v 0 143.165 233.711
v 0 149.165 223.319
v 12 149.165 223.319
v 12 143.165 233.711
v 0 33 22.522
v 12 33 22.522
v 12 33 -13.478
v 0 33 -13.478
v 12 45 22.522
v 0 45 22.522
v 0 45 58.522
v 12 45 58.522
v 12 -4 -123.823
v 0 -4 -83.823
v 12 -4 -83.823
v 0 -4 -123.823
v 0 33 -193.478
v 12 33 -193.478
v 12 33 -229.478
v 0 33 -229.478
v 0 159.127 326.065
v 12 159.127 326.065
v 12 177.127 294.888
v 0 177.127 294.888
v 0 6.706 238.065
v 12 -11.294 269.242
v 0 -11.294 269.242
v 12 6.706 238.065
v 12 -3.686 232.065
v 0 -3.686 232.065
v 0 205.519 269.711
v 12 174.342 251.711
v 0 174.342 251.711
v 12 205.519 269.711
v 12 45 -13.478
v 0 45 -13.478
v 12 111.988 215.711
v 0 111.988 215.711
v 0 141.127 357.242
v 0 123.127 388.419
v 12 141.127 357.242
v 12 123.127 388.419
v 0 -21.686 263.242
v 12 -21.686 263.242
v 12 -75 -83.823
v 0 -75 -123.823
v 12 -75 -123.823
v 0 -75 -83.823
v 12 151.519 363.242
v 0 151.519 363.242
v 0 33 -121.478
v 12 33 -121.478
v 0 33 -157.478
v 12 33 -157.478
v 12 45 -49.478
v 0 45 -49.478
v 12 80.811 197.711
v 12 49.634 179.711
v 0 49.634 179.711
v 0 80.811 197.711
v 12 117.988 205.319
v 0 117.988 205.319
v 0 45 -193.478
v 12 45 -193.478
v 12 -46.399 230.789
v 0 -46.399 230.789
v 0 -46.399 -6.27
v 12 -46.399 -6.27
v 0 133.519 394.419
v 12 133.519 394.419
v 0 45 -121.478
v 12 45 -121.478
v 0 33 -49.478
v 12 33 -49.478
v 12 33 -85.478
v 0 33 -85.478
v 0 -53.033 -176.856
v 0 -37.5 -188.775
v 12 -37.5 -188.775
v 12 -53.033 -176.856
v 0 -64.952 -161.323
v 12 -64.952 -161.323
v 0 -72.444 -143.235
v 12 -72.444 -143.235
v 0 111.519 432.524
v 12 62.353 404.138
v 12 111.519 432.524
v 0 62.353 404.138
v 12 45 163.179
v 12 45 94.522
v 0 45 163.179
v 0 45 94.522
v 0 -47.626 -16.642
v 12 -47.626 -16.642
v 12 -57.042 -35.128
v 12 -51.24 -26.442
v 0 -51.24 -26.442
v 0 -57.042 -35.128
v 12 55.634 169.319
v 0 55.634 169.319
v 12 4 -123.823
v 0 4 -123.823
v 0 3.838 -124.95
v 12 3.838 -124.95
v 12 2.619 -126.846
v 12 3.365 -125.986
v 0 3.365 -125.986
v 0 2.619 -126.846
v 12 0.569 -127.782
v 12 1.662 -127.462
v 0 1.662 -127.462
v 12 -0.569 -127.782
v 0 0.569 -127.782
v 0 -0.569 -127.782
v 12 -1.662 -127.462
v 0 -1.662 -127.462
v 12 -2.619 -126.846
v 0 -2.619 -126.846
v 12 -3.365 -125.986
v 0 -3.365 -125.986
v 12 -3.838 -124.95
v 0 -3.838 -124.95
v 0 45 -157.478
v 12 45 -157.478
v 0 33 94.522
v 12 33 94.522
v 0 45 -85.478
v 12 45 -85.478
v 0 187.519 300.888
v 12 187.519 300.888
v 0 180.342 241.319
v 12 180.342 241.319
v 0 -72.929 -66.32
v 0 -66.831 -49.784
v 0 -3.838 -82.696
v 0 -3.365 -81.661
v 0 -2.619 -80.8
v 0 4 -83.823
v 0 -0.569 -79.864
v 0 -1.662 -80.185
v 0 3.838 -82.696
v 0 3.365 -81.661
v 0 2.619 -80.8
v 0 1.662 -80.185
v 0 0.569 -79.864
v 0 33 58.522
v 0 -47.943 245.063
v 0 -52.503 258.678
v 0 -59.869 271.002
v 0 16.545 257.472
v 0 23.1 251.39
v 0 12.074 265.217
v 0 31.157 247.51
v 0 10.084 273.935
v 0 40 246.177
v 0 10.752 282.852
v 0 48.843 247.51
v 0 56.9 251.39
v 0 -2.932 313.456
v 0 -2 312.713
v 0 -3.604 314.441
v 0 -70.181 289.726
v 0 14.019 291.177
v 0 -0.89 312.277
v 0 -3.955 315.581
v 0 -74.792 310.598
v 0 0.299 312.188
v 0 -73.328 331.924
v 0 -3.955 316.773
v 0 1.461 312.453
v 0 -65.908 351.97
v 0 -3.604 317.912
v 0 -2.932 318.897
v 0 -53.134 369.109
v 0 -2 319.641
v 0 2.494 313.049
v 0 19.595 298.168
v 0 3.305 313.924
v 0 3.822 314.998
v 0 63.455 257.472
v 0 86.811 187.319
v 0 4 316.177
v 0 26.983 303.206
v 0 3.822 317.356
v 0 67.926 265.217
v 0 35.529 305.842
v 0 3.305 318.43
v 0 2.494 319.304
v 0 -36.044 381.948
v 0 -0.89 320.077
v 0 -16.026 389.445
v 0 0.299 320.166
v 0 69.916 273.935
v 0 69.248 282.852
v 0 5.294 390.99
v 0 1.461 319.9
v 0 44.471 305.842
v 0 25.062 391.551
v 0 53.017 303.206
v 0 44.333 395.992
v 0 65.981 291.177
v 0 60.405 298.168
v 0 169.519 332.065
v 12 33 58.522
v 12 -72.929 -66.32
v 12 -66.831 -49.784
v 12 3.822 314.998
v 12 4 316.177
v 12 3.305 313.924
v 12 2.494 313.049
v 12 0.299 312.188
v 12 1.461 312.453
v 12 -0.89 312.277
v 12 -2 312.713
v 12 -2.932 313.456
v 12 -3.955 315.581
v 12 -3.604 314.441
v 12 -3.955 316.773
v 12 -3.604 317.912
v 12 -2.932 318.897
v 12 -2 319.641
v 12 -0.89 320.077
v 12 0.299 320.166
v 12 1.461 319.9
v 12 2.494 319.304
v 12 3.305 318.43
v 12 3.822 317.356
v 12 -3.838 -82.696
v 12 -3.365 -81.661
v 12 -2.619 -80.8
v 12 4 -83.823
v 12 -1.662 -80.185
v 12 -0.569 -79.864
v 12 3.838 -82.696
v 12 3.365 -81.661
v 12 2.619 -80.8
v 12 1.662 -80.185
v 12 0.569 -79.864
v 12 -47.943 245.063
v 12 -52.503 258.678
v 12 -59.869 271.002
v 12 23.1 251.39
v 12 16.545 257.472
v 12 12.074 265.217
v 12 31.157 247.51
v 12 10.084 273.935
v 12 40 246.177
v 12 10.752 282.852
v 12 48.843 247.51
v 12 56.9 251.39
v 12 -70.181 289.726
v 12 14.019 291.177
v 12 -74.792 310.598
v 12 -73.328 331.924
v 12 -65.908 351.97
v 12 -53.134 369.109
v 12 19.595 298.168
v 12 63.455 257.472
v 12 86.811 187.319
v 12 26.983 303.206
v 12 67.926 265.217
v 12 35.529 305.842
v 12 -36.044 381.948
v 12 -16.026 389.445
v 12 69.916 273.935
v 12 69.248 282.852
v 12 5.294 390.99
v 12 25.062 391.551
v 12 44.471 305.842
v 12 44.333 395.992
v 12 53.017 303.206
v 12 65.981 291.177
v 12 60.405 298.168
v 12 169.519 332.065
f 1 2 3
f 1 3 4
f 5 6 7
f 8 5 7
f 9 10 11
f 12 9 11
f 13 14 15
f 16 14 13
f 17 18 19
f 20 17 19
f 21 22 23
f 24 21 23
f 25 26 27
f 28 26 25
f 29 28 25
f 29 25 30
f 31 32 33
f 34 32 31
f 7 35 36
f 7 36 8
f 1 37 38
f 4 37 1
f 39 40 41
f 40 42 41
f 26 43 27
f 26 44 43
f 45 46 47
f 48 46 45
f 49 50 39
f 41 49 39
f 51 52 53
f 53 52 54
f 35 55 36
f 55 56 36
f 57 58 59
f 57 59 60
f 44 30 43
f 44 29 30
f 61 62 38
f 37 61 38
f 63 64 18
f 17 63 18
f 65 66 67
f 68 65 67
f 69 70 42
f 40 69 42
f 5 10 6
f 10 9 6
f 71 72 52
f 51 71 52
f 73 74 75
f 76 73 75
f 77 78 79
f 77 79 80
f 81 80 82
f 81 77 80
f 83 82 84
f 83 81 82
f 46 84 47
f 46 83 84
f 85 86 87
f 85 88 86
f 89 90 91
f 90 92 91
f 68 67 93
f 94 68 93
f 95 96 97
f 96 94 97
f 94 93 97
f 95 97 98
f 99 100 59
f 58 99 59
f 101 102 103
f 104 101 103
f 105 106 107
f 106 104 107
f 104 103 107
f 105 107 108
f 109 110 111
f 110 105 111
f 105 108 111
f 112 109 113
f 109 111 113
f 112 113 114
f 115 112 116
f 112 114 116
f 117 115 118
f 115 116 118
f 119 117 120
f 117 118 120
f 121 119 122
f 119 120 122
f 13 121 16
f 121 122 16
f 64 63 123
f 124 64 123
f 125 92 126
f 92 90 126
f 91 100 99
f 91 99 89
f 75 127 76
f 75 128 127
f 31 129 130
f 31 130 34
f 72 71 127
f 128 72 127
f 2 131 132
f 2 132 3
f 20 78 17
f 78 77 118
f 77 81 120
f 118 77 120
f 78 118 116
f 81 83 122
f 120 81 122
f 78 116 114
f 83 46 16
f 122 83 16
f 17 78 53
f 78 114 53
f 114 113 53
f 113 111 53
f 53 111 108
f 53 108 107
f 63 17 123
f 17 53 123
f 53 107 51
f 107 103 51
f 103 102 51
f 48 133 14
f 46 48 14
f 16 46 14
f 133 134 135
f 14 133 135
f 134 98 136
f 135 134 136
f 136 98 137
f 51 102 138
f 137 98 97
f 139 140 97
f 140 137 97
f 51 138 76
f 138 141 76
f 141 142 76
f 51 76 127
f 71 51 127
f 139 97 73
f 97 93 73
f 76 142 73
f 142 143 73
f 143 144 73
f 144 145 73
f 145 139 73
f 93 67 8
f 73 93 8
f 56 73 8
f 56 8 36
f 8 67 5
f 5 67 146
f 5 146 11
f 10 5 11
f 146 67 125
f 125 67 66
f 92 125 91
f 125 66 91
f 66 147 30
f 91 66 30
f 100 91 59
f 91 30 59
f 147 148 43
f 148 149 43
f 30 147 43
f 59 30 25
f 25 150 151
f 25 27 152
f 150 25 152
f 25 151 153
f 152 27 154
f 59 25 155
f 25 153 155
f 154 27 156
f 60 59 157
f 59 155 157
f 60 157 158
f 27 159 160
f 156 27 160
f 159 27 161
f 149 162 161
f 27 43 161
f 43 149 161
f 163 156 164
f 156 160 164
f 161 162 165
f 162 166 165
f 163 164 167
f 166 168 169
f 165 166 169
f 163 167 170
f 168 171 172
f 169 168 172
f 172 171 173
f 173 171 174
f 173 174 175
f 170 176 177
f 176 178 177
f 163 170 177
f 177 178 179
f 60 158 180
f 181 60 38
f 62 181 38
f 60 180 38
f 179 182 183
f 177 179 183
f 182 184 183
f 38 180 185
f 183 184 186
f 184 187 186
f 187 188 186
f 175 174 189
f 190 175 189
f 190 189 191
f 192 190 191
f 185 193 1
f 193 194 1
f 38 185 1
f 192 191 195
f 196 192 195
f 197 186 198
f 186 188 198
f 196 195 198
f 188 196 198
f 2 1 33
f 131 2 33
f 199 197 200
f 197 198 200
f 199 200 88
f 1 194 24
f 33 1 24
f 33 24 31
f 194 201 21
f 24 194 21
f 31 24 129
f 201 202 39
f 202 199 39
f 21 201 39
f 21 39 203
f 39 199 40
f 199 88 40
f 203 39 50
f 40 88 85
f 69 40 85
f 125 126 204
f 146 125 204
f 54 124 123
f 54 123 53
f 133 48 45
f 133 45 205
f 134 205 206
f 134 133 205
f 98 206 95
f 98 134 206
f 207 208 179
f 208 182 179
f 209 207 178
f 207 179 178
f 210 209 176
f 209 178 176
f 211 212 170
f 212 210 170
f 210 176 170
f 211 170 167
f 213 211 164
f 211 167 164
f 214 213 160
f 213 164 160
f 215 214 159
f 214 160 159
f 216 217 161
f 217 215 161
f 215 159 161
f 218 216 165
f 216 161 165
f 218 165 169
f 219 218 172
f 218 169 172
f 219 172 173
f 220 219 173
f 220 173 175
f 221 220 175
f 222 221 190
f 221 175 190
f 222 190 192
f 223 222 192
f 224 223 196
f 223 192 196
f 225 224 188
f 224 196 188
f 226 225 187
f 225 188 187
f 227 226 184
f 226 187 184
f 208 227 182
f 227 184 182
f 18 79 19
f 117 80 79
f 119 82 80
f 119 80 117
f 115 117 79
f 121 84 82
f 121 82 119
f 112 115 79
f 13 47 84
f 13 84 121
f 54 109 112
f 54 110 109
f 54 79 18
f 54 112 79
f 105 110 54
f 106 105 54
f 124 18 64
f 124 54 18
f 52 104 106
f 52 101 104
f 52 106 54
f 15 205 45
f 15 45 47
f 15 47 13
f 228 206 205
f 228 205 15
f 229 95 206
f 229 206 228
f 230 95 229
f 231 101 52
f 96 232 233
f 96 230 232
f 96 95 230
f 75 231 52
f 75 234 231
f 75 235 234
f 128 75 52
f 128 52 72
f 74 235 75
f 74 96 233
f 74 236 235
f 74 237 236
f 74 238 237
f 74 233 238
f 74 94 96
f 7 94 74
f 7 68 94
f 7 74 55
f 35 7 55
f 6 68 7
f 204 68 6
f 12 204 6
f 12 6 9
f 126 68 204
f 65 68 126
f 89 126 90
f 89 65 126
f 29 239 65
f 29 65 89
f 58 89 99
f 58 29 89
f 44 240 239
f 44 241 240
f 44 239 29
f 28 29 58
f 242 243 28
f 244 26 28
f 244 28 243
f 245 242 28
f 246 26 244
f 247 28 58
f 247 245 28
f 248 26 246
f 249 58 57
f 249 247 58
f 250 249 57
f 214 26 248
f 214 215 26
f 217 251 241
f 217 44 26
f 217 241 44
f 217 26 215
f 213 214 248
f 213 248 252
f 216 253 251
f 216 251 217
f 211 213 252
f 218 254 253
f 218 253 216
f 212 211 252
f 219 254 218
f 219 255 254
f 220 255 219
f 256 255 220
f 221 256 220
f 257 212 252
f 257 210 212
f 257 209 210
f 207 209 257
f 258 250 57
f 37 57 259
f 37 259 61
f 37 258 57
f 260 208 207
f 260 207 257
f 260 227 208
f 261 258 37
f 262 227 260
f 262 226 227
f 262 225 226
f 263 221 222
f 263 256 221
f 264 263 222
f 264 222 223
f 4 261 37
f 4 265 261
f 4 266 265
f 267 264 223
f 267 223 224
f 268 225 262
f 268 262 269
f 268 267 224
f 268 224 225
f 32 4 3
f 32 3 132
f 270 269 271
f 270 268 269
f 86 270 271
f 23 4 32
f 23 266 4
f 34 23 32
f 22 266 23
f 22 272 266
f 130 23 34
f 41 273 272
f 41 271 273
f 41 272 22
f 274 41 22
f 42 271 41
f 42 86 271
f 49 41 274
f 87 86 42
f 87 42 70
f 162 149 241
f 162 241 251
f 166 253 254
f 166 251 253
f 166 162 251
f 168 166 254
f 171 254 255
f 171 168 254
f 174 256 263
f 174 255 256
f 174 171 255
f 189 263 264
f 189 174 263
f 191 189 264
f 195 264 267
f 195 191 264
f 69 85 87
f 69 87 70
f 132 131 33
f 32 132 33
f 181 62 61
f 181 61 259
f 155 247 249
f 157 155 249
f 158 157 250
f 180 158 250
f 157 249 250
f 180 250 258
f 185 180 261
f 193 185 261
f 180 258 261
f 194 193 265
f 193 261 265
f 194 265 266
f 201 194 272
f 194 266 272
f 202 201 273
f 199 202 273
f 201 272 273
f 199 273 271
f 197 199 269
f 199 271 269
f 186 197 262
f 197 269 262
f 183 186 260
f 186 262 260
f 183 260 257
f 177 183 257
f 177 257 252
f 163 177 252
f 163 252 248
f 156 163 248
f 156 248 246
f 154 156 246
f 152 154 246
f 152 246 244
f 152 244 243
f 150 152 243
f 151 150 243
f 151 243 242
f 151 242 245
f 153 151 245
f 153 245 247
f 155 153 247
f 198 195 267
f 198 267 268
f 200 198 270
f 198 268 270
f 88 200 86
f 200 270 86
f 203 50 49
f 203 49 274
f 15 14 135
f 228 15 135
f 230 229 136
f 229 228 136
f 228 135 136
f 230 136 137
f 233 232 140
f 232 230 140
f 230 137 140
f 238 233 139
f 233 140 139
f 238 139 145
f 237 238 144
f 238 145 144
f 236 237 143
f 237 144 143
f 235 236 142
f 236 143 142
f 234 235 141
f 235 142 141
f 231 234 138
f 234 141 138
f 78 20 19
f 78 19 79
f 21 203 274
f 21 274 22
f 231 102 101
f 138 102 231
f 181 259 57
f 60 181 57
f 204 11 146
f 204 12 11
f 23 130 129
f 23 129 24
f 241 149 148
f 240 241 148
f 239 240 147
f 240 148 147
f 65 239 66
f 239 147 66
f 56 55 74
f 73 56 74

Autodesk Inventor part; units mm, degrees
ref_plane "YZ Plane" through (0, 0, 0) normal (1, 0, 0) x (0, 1, 0)
ref_plane "XZ Plane" through (0, 0, 0) normal (0, 1, 0) x (-1, 0, 0)
ref_plane "XY Plane" through (0, 0, 0) normal (0, 0, 1) x (1, 0, 0)
sketch "Sketch1" plane through (0, 0, 0) normal (1, 0, 0) x (0, 1, 0)
  circle A0 centre (0, 316.1768) radius 4
  line L0 (0, -83.8232) -> (0, -123.8232)
  line L1 (-4, -83.8232) -> (-4, -123.8232)
  line L2 (4, -123.8232) -> (4, -83.8232)
  arc A1 (4, -83.8232) -> (-4, -83.8232) centre (0, -83.8232) ccw
  arc A2 (-4, -123.8232) -> (4, -123.8232) centre (0, -123.8232) ccw
  arc A3 (29.4615, 385.1479) -> (-59.8687, 271.0022) centre (0, 316.1768) ccw construction
  line L3 (-75, -123.8232) -> (-75, -83.8232) construction
  line L4 (45, -142.4909) -> (45, -229.6533) construction
  arc A4 (-75, -123.8232) -> (-37.5, -188.7751) centre (0, -123.8232) ccw construction
  circle A5 centre (0, 316.1768) radius 115 construction
  line L5 (-115, -63.8232) -> (-115, -123.8232) construction
  arc A6 (-115, -123.8232) -> (115, -123.8232) centre (0, -123.8232) ccw construction
  line L6 (115, -123.8232) -> (115, -63.8232) construction
  arc A7 (115, -63.8232) -> (-115, -63.8232) centre (0, -83.8232) ccw construction
  line L7 (111.5189, 432.5238) -> (211.5189, 259.3187)
  line L8 (211.5189, 259.3187) -> (45, 163.179)
  circle A8 centre (0, 316.1768) radius 45 construction
  arc A9 (29.4615, 385.1479) -> (-59.8687, 271.0022) centre (0, 316.1768) ccw
  line L9 (-75, -123.8232) -> (-75, -83.8232)
  arc A10 (-57.0417, -35.1278) -> (-75, -83.8232) centre (0, -83.8232) ccw
  arc A11 (-75, -123.8232) -> (-37.5, -188.7751) centre (0, -123.8232) ccw
  line L10 (-46.3992, 230.789) -> (-46.3992, -6.2697)
  arc A12 (-46.3992, 230.789) -> (-59.8687, 271.0022) centre (-113.1622, 230.789) ccw
  arc A13 (-57.0417, -35.1278) -> (-46.3992, -6.2697) centre (-90.846, -6.2697) ccw
  line L11 (45, -229.4783) -> (45, 163.179)
  line L12 (43.5102, 150.8148) -> (13.9439, 202.0253) construction
  line L13 (-38.9711, 293.6768) -> (-61.4711, 332.6479) construction
  line L14 (-61.4711, 332.6479) -> (-22.5, 355.1479) construction
  line L15 (29.4615, 385.1479) -> (111.5189, 432.5238)
  line L16 (45, -229.4783) -> (33, -229.4783)
  line L17 (33, -229.4783) -> (-37.5, -188.7751)
  line L18 (45, 316.1768) -> (45, 281.1768) construction
  line L19 (-75, -123.8232) -> (-75, -83.8232) construction
  arc A14 (75, -83.8232) -> (-75, -83.8232) centre (0, -83.8232) ccw construction
  line L20 (75, -83.8232) -> (75, -123.8232) construction
  arc A15 (-75, -123.8232) -> (75, -123.8232) centre (0, -123.8232) ccw construction
  point P0 (0, 0)
  point P1 (0, -103.8232)
  dimension "d7" = 230
  dimension "d0" = 8
  dimension "d1" = 8
  dimension "d2" = 400
  dimension "d3" = 40
  dimension "d5" = 150
  dimension "d8" = 115
  dimension "d9" = 200
  dimension "d10" = 200
  dimension "d12" = 90
  dimension "d13" = 12
  dimension "d15" = 120
  dimension "d16" = 120
  dimension "d17" = 75
extrude "Extrusion1" add sketch "Sketch1" along normal blind 12
fillet "Fillet1" radius 100 1 edges at (6, 29.4615, 385.1479)
sketch "Sketch2" plane through (12, 0, 0) normal (1, 0, 0) x (0, 0, -1)
  line L0 (229.4783, 45) -> (-163.179, 45) construction
  line L1 (229.4783, 45) -> (193.4783, 45)
  line L2 (193.4783, 45) -> (193.4783, 33)
  line L3 (193.4783, 33) -> (229.4783, 33)
  line L4 (229.4783, 33) -> (229.4783, 45)
  line L5 (-163.179, 45) -> (-259.3187, 211.5189) construction
  line L6 (-432.5238, 111.5189) -> (-404.1377, 62.3528) construction
  line L7 (-259.3187, 211.5189) -> (-432.5238, 111.5189) construction
  line L8 (-432.5238, 111.5189) -> (-332.5238, -61.6862) construction
  line L9 (-332.5238, -61.6862) -> (-159.3187, 38.3138) construction
  line L10 (-159.3187, 38.3138) -> (-259.3187, 211.5189) construction
  line L11 (-259.3187, 211.5189) -> (-241.3187, 180.342)
  line L12 (-241.3187, 180.342) -> (-251.711, 174.342)
  line L13 (-251.711, 174.342) -> (-269.711, 205.5189)
  line L14 (-269.711, 205.5189) -> (-259.3187, 211.5189)
  line L15 (-432.5238, 111.5189) -> (-159.3187, 38.3138) construction
  line L16 (193.4783, 45) -> (157.4783, 45)
  line L17 (157.4783, 33) -> (193.4783, 33)
  line L18 (193.4783, 33) -> (193.4783, 45)
  line L19 (157.4783, 45) -> (157.4783, 33)
  line L20 (157.4783, 45) -> (121.4783, 45)
  line L21 (121.4783, 33) -> (157.4783, 33)
  line L22 (157.4783, 33) -> (157.4783, 45)
  line L23 (121.4783, 45) -> (121.4783, 33)
  line L24 (121.4783, 45) -> (85.4783, 45)
  line L25 (85.4783, 33) -> (121.4783, 33)
  line L26 (121.4783, 33) -> (121.4783, 45)
  line L27 (85.4783, 45) -> (85.4783, 33)
  line L28 (85.4783, 45) -> (49.4783, 45)
  line L29 (49.4783, 33) -> (85.4783, 33)
  line L30 (85.4783, 33) -> (85.4783, 45)
  line L31 (49.4783, 45) -> (49.4783, 33)
  line L32 (49.4783, 45) -> (13.4783, 45)
  line L33 (13.4783, 33) -> (49.4783, 33)
  line L34 (49.4783, 33) -> (49.4783, 45)
  line L35 (13.4783, 45) -> (13.4783, 33)
  line L36 (13.4783, 45) -> (-22.5217, 45)
  line L37 (-22.5217, 33) -> (13.4783, 33)
  line L38 (13.4783, 33) -> (13.4783, 45)
  line L39 (-22.5217, 45) -> (-22.5217, 33)
  line L40 (-22.5217, 45) -> (-58.5217, 45)
  line L41 (-58.5217, 33) -> (-22.5217, 33)
  line L42 (-22.5217, 33) -> (-22.5217, 45)
  line L43 (-58.5217, 45) -> (-58.5217, 33)
  line L44 (-58.5217, 45) -> (-94.5217, 45)
  line L45 (-94.5217, 33) -> (-58.5217, 33)
  line L46 (-58.5217, 33) -> (-58.5217, 45)
  line L47 (-94.5217, 45) -> (-94.5217, 33)
  line L48 (-94.5217, 45) -> (-130.5217, 45)
  line L49 (-130.5217, 33) -> (-94.5217, 33)
  line L50 (-94.5217, 33) -> (-94.5217, 45)
  line L51 (-130.5217, 45) -> (-130.5217, 33)
  line L52 (-130.5217, 45) -> (-166.5217, 45)
  line L53 (-166.5217, 33) -> (-130.5217, 33)
  line L54 (-130.5217, 33) -> (-130.5217, 45)
  line L55 (-166.5217, 45) -> (-166.5217, 33)
  line L56 (-166.5217, 45) -> (-202.5217, 45)
  line L57 (-202.5217, 33) -> (-166.5217, 33)
  line L58 (-166.5217, 33) -> (-166.5217, 45)
  line L59 (-202.5217, 45) -> (-202.5217, 33)
  line L60 (-251.711, 174.342) -> (-241.3187, 180.342)
  line L61 (-233.711, 143.1651) -> (-251.711, 174.342)
  line L62 (-241.3187, 180.342) -> (-223.3187, 149.1651)
  line L63 (-223.3187, 149.1651) -> (-233.711, 143.1651)
  line L64 (-233.711, 143.1651) -> (-223.3187, 149.1651)
  line L65 (-215.711, 111.9882) -> (-233.711, 143.1651)
  line L66 (-223.3187, 149.1651) -> (-205.3187, 117.9882)
  line L67 (-205.3187, 117.9882) -> (-215.711, 111.9882)
  line L68 (-215.711, 111.9882) -> (-205.3187, 117.9882)
  line L69 (-197.711, 80.8112) -> (-215.711, 111.9882)
  line L70 (-205.3187, 117.9882) -> (-187.3187, 86.8112)
  line L71 (-187.3187, 86.8112) -> (-197.711, 80.8112)
  line L72 (-197.711, 80.8112) -> (-187.3187, 86.8112)
  line L73 (-179.711, 49.6343) -> (-197.711, 80.8112)
  line L74 (-187.3187, 86.8112) -> (-169.3187, 55.6343)
  line L75 (-169.3187, 55.6343) -> (-179.711, 49.6343)
  line L76 (-259.3187, 211.5189) -> (-432.5238, 111.5189) projected
  line L77 (-269.711, 205.5189) -> (-300.8879, 187.5189)
  line L78 (-300.8879, 187.5189) -> (-294.8879, 177.1266)
  line L79 (-294.8879, 177.1266) -> (-263.711, 195.1266)
  line L80 (-263.711, 195.1266) -> (-269.711, 205.5189)
  line L81 (-294.8879, 177.1266) -> (-300.8879, 187.5189)
  line L82 (-326.0648, 159.1266) -> (-294.8879, 177.1266)
  line L83 (-300.8879, 187.5189) -> (-332.0648, 169.5189)
  line L84 (-332.0648, 169.5189) -> (-326.0648, 159.1266)
  line L85 (-290.4956, 193.5189) -> (-463.7007, 93.5189) construction
  line L86 (-326.0648, 159.1266) -> (-332.0648, 169.5189)
  line L87 (-357.2417, 141.1266) -> (-326.0648, 159.1266)
  line L88 (-332.0648, 169.5189) -> (-363.2417, 151.5189)
  line L89 (-363.2417, 151.5189) -> (-357.2417, 141.1266)
  line L90 (-321.6725, 175.5189) -> (-494.8776, 75.5189) construction
  line L91 (-357.2417, 141.1266) -> (-363.2417, 151.5189)
  line L92 (-388.4187, 123.1266) -> (-357.2417, 141.1266)
  line L93 (-363.2417, 151.5189) -> (-394.4187, 133.5189)
  line L94 (-394.4187, 133.5189) -> (-388.4187, 123.1266)
  line L95 (-352.8494, 157.5189) -> (-526.0545, 57.5189) construction
  line L96 (-388.4187, 123.1266) -> (-394.4187, 133.5189)
  line L97 (-419.5956, 105.1266) -> (-388.4187, 123.1266)
  line L98 (-394.4187, 133.5189) -> (-425.5956, 115.5189)
  line L99 (-425.5956, 115.5189) -> (-419.5956, 105.1266)
  line L100 (-384.0264, 139.5189) -> (-557.2314, 39.5189) construction
  line L101 (-232.0648, -3.6862) -> (-263.2417, -21.6862)
  line L102 (-263.2417, -21.6862) -> (-269.2417, -11.2939)
  line L103 (-269.2417, -11.2939) -> (-238.0648, 6.7061)
  line L104 (-238.0648, 6.7061) -> (-232.0648, -3.6862)
  circle A0 centre (-276.1768, 40) radius 30
  circle A1 centre (-316.1768, 0) radius 4 projected
  point P0 (-295.9212, 74.9164)
  dimension "d21" = 12
  dimension "d22" = 36
  dimension "d26" = 200
  dimension "d27" = 12
  dimension "d28" = 36
  dimension "d31" = 36
  dimension "d38" = 36
  dimension "d45" = 12
  dimension "d46" = 36
  dimension "d49" = 36
  dimension "d54" = 60
  dimension "d55" = 40
  dimension "d56" = 40
  dimension "d57" = 12
extrude "Extrusion2" cut sketch "Sketch2" against normal blind 12 contours L4 L3 L2 L1 | L19 L21 L23 L20 | L27 L29 L31 L28 | L35 L37 L39 L36 | L43 L45 L47 L44 | L11 L12 L13 L14 | L66 L67 L65 L63 | L78 L82 L84 L76 | L74 L75 L73 L71 | L89 L92 L94 L76 | L101 L102 L103 L104 | A0
sketch "Sketch3" plane through (12, 0, 0) normal (1, 0, 0) x (0, 0, -1)
  line L0 (-326.0648, 159.1266) -> (-332.0648, 169.5189) projected
  line L1 (-332.0648, 169.5189) -> (-363.2417, 151.5189) projected
  line L2 (-363.2417, 151.5189) -> (-357.2417, 141.1266) projected
  line L3 (-357.2417, 141.1266) -> (-388.4187, 123.1266) projected
  line L4 (-388.4187, 123.1266) -> (-394.4187, 133.5189) projected
  line L5 (-394.4187, 133.5189) -> (-432.5238, 111.5189) projected
  line L6 (-432.5238, 111.5189) -> (-404.1377, 62.3528) projected
  arc A0 (-390.9897, 5.2941) -> (-404.1377, 62.3528) centre (-490.7403, 12.3528) ccw projected
  arc A1 (-390.9897, 5.2941) -> (-271.0022, -59.8687) centre (-316.1768, 0) ccw projected
  arc A2 (-230.789, -46.3992) -> (-271.0022, -59.8687) centre (-230.789, -113.1622) ccw projected
  line L7 (-230.789, -46.3992) -> (6.2697, -46.3992) projected
  arc A3 (35.1278, -57.0417) -> (6.2697, -46.3992) centre (6.2697, -90.846) ccw projected
  arc A4 (35.1278, -57.0417) -> (83.8232, -75) centre (83.8232, 0) ccw projected
  line L8 (83.8232, -75) -> (123.8232, -75) projected
  arc A5 (123.8232, -75) -> (188.7751, -37.5) centre (123.8232, 0) ccw projected
  line L9 (188.7751, -37.5) -> (229.4783, 33) projected
  line L10 (229.4783, 33) -> (193.4783, 33) projected
  line L11 (193.4783, 33) -> (193.4783, 45) projected
  line L12 (193.4783, 45) -> (157.4783, 45) projected
  line L13 (157.4783, 45) -> (157.4783, 33) projected
  line L14 (157.4783, 33) -> (121.4783, 33) projected
  line L15 (121.4783, 33) -> (121.4783, 45) projected
  line L16 (121.4783, 45) -> (85.4783, 45) projected
  line L17 (85.4783, 45) -> (85.4783, 33) projected
  line L18 (85.4783, 33) -> (49.4783, 33) projected
  line L19 (49.4783, 33) -> (49.4783, 45) projected
  line L20 (49.4783, 45) -> (13.4783, 45) projected
  line L21 (13.4783, 45) -> (13.4783, 33) projected
  line L22 (13.4783, 33) -> (-22.5217, 33) projected
  line L23 (-22.5217, 33) -> (-22.5217, 45) projected
  line L24 (-22.5217, 45) -> (-58.5217, 45) projected
  line L25 (-58.5217, 45) -> (-58.5217, 33) projected
  line L26 (-58.5217, 33) -> (-94.5217, 33) projected
  line L27 (-94.5217, 33) -> (-94.5217, 45) projected
  line L28 (-94.5217, 45) -> (-163.179, 45) projected
  line L29 (-163.179, 45) -> (-169.3187, 55.6343) projected
  line L30 (-169.3187, 55.6343) -> (-179.711, 49.6343) projected
  line L31 (-179.711, 49.6343) -> (-197.711, 80.8112) projected
  line L32 (-197.711, 80.8112) -> (-187.3187, 86.8112) projected
  line L33 (-187.3187, 86.8112) -> (-205.3187, 117.9882) projected
  line L34 (-205.3187, 117.9882) -> (-215.711, 111.9882) projected
  line L35 (-215.711, 111.9882) -> (-233.711, 143.1651) projected
  line L36 (-233.711, 143.1651) -> (-223.3187, 149.1651) projected
  line L37 (-223.3187, 149.1651) -> (-241.3187, 180.342) projected
  line L38 (-241.3187, 180.342) -> (-251.711, 174.342) projected
  line L39 (-251.711, 174.342) -> (-269.711, 205.5189) projected
  line L40 (-269.711, 205.5189) -> (-300.8879, 187.5189) projected
  line L41 (-300.8879, 187.5189) -> (-294.8879, 177.1266) projected
  line L42 (-294.8879, 177.1266) -> (-326.0648, 159.1266) projected
  line L43 (-238.0648, 6.7061) -> (-232.0648, -3.6862) projected
  line L44 (-232.0648, -3.6862) -> (-263.2417, -21.6862) projected
  line L45 (-263.2417, -21.6862) -> (-269.2417, -11.2939) projected
  line L46 (-269.2417, -11.2939) -> (-238.0648, 6.7061) projected
  circle A6 centre (-276.1768, 40) radius 30 projected
  line L47 (83.8232, 4) -> (123.8232, 4) projected
  arc A7 (123.8232, -4) -> (123.8232, 4) centre (123.8232, 0) ccw projected
  line L48 (123.8232, -4) -> (83.8232, -4) projected
  arc A8 (83.8232, 4) -> (83.8232, -4) centre (83.8232, 0) ccw projected
  circle A9 centre (-316.1768, 0) radius 4 projected
  point P0 (0, 0)
equation "\"d8\" = 0.5 * d7"
equation "\"wood_thickness\" = 12"
properties part number "wooden_side"
